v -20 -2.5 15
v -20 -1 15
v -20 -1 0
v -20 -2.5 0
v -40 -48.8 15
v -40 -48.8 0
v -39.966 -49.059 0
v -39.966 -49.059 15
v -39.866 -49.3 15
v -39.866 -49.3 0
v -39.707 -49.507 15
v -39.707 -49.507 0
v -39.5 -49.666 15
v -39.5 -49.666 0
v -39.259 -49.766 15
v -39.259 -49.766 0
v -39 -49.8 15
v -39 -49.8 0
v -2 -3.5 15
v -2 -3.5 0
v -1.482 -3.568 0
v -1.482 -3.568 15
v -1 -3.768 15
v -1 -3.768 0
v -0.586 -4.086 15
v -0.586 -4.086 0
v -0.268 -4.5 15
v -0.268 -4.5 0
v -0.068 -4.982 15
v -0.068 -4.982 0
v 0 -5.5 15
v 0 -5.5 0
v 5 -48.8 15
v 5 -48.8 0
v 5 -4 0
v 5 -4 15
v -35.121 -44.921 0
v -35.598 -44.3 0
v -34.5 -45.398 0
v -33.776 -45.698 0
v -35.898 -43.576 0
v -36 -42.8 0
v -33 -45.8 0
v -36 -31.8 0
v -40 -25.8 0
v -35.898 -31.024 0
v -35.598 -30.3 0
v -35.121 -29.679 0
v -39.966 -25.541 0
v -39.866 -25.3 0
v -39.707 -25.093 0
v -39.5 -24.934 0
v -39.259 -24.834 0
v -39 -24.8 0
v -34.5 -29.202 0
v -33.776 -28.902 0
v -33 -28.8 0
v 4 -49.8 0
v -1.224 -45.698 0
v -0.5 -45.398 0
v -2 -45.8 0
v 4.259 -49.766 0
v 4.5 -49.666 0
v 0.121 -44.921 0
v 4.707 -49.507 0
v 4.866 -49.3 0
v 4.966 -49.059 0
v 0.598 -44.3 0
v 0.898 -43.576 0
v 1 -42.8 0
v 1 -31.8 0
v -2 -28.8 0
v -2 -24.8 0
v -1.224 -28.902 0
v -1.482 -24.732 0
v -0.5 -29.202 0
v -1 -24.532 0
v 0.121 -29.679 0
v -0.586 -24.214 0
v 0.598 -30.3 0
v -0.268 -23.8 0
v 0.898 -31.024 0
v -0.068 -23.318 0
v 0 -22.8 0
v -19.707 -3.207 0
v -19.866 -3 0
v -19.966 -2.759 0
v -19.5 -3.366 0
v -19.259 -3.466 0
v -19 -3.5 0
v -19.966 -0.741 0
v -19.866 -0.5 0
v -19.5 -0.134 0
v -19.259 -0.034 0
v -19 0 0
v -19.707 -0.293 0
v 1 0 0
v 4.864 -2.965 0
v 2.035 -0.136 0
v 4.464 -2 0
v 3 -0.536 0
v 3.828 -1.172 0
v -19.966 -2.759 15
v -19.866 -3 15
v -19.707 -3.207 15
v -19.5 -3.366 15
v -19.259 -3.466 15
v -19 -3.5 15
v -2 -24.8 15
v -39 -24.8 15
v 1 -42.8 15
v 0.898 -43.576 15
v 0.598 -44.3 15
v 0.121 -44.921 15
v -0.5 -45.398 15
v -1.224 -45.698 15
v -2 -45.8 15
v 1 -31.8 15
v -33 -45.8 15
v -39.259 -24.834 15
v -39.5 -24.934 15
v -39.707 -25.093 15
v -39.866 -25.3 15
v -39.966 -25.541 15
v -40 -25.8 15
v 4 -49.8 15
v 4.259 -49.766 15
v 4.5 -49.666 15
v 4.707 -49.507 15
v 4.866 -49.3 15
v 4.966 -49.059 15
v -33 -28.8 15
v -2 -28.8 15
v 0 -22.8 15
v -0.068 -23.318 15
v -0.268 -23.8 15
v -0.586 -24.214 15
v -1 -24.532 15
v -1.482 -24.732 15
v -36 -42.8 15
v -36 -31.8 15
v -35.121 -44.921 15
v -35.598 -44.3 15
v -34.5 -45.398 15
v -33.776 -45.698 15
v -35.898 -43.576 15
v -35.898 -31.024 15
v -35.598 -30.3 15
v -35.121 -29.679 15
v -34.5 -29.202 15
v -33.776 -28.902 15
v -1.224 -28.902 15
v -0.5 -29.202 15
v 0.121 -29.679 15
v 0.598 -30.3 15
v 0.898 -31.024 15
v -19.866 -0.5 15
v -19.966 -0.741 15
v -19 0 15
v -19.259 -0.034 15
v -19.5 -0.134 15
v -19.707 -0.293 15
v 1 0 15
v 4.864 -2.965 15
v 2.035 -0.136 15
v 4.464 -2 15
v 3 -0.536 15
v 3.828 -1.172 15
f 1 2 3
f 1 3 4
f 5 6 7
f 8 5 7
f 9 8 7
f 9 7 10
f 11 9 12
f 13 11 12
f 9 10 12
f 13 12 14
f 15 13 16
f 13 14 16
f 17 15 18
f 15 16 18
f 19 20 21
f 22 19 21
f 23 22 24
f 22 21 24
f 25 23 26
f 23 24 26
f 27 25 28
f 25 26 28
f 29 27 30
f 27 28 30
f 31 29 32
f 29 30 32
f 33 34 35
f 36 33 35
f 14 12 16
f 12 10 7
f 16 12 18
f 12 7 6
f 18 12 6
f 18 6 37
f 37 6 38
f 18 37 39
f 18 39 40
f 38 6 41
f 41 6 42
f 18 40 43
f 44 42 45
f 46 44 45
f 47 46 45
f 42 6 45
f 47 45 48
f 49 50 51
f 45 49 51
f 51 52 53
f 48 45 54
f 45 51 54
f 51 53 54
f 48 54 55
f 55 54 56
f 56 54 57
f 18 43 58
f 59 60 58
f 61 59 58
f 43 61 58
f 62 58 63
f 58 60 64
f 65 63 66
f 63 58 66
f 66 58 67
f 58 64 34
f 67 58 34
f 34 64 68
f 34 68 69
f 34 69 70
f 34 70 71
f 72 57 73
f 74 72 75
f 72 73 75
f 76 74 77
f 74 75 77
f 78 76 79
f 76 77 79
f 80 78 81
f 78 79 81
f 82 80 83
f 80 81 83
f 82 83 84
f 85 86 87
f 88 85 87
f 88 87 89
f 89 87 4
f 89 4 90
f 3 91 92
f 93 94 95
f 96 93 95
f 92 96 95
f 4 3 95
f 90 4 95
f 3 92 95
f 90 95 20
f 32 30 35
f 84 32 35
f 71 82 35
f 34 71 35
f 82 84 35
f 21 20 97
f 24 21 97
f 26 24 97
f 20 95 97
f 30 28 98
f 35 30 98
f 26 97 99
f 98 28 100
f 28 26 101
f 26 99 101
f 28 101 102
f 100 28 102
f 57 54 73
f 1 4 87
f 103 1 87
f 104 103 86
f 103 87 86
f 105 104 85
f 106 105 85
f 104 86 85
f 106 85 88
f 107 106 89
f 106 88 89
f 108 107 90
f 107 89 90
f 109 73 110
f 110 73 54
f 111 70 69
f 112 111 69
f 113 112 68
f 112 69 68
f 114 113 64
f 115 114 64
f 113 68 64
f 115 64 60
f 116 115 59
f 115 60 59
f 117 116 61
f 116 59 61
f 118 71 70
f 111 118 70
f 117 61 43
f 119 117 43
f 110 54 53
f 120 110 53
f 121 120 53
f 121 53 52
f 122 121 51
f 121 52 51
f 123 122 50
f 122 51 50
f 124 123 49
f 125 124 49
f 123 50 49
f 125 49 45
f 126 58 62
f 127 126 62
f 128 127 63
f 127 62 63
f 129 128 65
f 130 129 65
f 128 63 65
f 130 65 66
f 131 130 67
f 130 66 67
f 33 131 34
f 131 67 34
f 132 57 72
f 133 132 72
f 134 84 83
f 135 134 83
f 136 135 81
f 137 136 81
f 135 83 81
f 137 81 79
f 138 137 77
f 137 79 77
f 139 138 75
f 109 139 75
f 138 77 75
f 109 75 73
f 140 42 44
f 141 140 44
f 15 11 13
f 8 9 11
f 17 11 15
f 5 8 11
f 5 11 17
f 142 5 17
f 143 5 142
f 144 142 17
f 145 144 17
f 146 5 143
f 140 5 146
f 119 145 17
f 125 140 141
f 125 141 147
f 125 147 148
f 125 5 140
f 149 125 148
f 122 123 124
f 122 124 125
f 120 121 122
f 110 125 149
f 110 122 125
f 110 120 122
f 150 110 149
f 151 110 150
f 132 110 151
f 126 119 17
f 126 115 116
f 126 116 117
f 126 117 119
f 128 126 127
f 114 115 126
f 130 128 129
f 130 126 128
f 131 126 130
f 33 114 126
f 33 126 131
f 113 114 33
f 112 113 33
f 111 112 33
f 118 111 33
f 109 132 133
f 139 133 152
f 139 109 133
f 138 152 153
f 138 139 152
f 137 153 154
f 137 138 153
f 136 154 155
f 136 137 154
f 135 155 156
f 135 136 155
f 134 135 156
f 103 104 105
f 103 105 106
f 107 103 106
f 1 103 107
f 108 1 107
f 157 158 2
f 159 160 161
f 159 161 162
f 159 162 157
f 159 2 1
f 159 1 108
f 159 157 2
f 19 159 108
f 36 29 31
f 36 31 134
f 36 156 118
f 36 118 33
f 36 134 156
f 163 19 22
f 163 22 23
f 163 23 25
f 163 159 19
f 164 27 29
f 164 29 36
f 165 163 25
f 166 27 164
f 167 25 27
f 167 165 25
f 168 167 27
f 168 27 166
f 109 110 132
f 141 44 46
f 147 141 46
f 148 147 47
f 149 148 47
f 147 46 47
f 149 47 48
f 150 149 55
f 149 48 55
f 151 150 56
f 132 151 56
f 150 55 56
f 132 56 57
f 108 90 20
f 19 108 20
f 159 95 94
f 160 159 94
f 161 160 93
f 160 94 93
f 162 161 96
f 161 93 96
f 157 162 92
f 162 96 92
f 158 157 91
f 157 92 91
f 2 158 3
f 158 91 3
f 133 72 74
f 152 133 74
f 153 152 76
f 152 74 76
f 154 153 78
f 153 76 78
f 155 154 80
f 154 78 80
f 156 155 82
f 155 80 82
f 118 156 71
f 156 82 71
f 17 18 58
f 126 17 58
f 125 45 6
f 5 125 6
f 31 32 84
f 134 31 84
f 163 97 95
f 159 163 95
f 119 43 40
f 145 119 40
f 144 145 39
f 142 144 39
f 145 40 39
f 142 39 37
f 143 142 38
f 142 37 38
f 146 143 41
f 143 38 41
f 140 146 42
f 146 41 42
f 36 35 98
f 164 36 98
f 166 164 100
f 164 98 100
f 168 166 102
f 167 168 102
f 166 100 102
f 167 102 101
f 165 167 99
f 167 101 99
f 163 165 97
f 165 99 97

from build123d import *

# Parameters (mm, degrees)
F1_DEPTH = 15


with BuildPart() as f1:
    # F0 (on Top) → F1 (new body)
    with BuildSketch(Plane.XY):
        with BuildLine():
            Line((1, 0), (0, 0))
            Line((0, 0), (-19, 0))
            ThreePointArc((-19, 0), (-19.707107, -0.292893), (-20, -1))
            Line((-20, -1), (-20, -2.5))
            ThreePointArc((-20, -2.5), (-19.707107, -3.207107), (-19, -3.5))
            Line((-19, -3.5), (-2, -3.5))
            ThreePointArc((-2, -3.5), (-0.585786, -4.085786), (0, -5.5))
            Line((0, -5.5), (0, -22.8))
            ThreePointArc((0, -22.8), (-0.585786, -24.214214), (-2, -24.8))
            Line((-2, -24.8), (-39, -24.8))
            ThreePointArc((-39, -24.8), (-39.707107, -25.092893), (-40, -25.8))
            Line((-40, -25.8), (-40, -48.8))
            ThreePointArc((-40, -48.8), (-39.707107, -49.507107), (-39, -49.8))
            Line((-39, -49.8), (4, -49.8))
            ThreePointArc((4, -49.8), (4.707107, -49.507107), (5, -48.8))
            Line((5, -48.8), (5, -4))
            ThreePointArc((5, -4), (3.828427, -1.171573), (1, 0))
        make_face()
        with BuildLine():
            ThreePointArc((-36, -31.8), (-35.12132, -29.67868), (-33, -28.8))
            Line((-33, -28.8), (-2, -28.8))
            ThreePointArc((-2, -28.8), (0.12132, -29.67868), (1, -31.8))
            Line((1, -31.8), (1, -42.8))
            ThreePointArc((1, -42.8), (0.12132, -44.92132), (-2, -45.8))
            Line((-2, -45.8), (-33, -45.8))
            ThreePointArc((-33, -45.8), (-35.12132, -44.92132), (-36, -42.8))
            Line((-36, -42.8), (-36, -31.8))
        make_face(mode=Mode.SUBTRACT)
    extrude(amount=F1_DEPTH)


solid = f1.part
